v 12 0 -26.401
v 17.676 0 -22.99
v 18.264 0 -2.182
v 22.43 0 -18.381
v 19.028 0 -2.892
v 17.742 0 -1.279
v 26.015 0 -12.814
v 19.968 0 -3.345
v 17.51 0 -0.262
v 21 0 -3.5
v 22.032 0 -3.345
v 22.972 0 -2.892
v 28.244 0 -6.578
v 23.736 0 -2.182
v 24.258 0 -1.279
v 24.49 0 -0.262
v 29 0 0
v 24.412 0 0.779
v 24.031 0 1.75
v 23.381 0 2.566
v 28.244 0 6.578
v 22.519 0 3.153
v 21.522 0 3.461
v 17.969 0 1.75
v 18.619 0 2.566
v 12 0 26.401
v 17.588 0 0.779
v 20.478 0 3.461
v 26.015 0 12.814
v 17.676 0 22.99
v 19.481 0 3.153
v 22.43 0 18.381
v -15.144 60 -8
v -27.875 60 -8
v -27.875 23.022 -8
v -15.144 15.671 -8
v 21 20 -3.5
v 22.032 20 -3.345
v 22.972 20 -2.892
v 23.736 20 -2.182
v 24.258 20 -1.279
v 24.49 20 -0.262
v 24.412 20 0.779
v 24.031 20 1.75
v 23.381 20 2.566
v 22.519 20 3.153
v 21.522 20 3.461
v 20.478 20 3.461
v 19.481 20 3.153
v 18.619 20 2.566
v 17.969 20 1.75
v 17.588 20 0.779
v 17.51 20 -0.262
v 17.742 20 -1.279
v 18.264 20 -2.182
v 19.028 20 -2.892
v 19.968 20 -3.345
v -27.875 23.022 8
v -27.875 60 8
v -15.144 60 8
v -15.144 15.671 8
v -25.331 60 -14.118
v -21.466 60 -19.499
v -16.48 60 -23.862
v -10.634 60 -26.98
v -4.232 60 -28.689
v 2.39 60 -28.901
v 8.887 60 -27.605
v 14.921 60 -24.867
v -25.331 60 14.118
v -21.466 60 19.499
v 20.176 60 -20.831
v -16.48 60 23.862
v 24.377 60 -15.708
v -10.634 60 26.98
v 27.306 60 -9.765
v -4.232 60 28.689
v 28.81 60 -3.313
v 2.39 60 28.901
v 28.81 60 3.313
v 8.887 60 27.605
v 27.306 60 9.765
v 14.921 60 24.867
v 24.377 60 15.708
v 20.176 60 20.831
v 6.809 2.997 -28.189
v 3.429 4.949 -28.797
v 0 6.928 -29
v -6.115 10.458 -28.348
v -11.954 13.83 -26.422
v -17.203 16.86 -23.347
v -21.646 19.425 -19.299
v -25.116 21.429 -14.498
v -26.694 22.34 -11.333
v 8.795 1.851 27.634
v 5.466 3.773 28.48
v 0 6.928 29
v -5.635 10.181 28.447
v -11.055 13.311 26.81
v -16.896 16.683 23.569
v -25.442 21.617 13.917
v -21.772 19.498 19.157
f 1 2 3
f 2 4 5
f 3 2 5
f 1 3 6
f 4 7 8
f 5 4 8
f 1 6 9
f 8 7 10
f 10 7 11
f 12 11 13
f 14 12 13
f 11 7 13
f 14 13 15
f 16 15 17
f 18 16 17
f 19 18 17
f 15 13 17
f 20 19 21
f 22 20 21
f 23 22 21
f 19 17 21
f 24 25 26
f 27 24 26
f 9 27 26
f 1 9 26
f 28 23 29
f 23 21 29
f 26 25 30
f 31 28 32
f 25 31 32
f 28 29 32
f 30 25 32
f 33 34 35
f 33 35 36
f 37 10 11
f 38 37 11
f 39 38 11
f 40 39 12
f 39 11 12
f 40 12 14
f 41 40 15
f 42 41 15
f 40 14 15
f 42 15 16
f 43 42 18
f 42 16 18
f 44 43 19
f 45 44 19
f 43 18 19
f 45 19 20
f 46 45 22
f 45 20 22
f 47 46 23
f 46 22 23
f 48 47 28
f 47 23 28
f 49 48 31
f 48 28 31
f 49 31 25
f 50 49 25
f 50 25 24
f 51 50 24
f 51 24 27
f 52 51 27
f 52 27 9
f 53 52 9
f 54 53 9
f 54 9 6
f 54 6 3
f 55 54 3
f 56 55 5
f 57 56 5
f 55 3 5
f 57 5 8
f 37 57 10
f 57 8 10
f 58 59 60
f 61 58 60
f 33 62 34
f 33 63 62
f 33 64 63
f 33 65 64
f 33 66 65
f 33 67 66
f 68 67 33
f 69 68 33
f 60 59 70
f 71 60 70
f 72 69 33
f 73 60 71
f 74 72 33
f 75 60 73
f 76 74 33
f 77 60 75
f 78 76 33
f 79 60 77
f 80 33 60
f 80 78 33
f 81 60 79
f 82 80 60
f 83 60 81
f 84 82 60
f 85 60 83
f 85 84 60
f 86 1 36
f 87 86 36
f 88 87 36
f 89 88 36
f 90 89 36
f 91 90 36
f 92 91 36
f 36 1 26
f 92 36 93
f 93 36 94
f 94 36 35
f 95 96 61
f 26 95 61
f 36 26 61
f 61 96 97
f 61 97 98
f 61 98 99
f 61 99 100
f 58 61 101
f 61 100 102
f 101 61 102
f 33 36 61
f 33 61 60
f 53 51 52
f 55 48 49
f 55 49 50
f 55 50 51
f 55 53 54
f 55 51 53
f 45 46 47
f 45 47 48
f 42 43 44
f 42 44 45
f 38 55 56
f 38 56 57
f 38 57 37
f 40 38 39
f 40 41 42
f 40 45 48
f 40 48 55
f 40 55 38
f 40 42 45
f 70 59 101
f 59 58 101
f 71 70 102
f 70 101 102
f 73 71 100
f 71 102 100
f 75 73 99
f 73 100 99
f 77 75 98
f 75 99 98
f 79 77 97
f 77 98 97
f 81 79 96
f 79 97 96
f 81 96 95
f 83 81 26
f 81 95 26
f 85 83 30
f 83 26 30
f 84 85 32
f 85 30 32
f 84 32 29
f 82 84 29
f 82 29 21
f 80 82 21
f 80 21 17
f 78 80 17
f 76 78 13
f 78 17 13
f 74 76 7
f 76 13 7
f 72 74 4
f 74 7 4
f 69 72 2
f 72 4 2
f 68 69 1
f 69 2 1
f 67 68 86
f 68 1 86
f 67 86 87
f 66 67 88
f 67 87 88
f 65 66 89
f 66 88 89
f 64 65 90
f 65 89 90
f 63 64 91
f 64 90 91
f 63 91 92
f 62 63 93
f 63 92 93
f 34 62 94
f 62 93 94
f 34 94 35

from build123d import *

# Parameters (mm, degrees)
SKETCH5_R           = 29
BOSS_EXTRUDE2_DEPTH = 60
CUT_EXTRUDE1_DEPTH  = 58
CUT_EXTRUDE3_START  = -8
CUT_EXTRUDE3_DEPTH  = 16
SKETCH10_R          = 3.5
CUT_EXTRUDE4_DEPTH  = 20


# Read off the part's stored shape, not the designer's step: Cut-Extrude3
with BuildPart() as part:
    # Sketch5 → Boss-Extrude2 (new body)
    with BuildSketch(Plane(origin=(0, 0, 0), x_dir=(1, 0, 0), z_dir=(0, 1, 0))):
        with Locations(Location((0, 0, 0), (0, 0, 270))):
            Circle(SKETCH5_R)
    extrude(amount=BOSS_EXTRUDE2_DEPTH)

    # Sketch7 → Cut-Extrude1 (cut)
    with BuildSketch(Plane.XY.offset(29)):
        Polygon((12, 0), (-29, 23.671361037), (-29, 0), align=None)
    extrude(amount=-CUT_EXTRUDE1_DEPTH, mode=Mode.SUBTRACT)

    # Cut-Extrude3 outline → Cut-Extrude3 (cut)
    with BuildSketch(Plane.XY.offset(CUT_EXTRUDE3_START)):
        Polygon((-29, 23.671361037), (-15.143593539, 15.671361037), (-15.143593539, 60), (-30, 60), (-30, 24.248711306), align=None)
    extrude(amount=CUT_EXTRUDE3_DEPTH, mode=Mode.SUBTRACT)

    # Sketch10 → Cut-Extrude4 (cut)
    with BuildSketch(Plane.XZ):
        with Locations(Location((21, 0, 0), (0, 0, 270))):
            Circle(SKETCH10_R)
    extrude(amount=-CUT_EXTRUDE4_DEPTH, mode=Mode.SUBTRACT)


solid = part.part
